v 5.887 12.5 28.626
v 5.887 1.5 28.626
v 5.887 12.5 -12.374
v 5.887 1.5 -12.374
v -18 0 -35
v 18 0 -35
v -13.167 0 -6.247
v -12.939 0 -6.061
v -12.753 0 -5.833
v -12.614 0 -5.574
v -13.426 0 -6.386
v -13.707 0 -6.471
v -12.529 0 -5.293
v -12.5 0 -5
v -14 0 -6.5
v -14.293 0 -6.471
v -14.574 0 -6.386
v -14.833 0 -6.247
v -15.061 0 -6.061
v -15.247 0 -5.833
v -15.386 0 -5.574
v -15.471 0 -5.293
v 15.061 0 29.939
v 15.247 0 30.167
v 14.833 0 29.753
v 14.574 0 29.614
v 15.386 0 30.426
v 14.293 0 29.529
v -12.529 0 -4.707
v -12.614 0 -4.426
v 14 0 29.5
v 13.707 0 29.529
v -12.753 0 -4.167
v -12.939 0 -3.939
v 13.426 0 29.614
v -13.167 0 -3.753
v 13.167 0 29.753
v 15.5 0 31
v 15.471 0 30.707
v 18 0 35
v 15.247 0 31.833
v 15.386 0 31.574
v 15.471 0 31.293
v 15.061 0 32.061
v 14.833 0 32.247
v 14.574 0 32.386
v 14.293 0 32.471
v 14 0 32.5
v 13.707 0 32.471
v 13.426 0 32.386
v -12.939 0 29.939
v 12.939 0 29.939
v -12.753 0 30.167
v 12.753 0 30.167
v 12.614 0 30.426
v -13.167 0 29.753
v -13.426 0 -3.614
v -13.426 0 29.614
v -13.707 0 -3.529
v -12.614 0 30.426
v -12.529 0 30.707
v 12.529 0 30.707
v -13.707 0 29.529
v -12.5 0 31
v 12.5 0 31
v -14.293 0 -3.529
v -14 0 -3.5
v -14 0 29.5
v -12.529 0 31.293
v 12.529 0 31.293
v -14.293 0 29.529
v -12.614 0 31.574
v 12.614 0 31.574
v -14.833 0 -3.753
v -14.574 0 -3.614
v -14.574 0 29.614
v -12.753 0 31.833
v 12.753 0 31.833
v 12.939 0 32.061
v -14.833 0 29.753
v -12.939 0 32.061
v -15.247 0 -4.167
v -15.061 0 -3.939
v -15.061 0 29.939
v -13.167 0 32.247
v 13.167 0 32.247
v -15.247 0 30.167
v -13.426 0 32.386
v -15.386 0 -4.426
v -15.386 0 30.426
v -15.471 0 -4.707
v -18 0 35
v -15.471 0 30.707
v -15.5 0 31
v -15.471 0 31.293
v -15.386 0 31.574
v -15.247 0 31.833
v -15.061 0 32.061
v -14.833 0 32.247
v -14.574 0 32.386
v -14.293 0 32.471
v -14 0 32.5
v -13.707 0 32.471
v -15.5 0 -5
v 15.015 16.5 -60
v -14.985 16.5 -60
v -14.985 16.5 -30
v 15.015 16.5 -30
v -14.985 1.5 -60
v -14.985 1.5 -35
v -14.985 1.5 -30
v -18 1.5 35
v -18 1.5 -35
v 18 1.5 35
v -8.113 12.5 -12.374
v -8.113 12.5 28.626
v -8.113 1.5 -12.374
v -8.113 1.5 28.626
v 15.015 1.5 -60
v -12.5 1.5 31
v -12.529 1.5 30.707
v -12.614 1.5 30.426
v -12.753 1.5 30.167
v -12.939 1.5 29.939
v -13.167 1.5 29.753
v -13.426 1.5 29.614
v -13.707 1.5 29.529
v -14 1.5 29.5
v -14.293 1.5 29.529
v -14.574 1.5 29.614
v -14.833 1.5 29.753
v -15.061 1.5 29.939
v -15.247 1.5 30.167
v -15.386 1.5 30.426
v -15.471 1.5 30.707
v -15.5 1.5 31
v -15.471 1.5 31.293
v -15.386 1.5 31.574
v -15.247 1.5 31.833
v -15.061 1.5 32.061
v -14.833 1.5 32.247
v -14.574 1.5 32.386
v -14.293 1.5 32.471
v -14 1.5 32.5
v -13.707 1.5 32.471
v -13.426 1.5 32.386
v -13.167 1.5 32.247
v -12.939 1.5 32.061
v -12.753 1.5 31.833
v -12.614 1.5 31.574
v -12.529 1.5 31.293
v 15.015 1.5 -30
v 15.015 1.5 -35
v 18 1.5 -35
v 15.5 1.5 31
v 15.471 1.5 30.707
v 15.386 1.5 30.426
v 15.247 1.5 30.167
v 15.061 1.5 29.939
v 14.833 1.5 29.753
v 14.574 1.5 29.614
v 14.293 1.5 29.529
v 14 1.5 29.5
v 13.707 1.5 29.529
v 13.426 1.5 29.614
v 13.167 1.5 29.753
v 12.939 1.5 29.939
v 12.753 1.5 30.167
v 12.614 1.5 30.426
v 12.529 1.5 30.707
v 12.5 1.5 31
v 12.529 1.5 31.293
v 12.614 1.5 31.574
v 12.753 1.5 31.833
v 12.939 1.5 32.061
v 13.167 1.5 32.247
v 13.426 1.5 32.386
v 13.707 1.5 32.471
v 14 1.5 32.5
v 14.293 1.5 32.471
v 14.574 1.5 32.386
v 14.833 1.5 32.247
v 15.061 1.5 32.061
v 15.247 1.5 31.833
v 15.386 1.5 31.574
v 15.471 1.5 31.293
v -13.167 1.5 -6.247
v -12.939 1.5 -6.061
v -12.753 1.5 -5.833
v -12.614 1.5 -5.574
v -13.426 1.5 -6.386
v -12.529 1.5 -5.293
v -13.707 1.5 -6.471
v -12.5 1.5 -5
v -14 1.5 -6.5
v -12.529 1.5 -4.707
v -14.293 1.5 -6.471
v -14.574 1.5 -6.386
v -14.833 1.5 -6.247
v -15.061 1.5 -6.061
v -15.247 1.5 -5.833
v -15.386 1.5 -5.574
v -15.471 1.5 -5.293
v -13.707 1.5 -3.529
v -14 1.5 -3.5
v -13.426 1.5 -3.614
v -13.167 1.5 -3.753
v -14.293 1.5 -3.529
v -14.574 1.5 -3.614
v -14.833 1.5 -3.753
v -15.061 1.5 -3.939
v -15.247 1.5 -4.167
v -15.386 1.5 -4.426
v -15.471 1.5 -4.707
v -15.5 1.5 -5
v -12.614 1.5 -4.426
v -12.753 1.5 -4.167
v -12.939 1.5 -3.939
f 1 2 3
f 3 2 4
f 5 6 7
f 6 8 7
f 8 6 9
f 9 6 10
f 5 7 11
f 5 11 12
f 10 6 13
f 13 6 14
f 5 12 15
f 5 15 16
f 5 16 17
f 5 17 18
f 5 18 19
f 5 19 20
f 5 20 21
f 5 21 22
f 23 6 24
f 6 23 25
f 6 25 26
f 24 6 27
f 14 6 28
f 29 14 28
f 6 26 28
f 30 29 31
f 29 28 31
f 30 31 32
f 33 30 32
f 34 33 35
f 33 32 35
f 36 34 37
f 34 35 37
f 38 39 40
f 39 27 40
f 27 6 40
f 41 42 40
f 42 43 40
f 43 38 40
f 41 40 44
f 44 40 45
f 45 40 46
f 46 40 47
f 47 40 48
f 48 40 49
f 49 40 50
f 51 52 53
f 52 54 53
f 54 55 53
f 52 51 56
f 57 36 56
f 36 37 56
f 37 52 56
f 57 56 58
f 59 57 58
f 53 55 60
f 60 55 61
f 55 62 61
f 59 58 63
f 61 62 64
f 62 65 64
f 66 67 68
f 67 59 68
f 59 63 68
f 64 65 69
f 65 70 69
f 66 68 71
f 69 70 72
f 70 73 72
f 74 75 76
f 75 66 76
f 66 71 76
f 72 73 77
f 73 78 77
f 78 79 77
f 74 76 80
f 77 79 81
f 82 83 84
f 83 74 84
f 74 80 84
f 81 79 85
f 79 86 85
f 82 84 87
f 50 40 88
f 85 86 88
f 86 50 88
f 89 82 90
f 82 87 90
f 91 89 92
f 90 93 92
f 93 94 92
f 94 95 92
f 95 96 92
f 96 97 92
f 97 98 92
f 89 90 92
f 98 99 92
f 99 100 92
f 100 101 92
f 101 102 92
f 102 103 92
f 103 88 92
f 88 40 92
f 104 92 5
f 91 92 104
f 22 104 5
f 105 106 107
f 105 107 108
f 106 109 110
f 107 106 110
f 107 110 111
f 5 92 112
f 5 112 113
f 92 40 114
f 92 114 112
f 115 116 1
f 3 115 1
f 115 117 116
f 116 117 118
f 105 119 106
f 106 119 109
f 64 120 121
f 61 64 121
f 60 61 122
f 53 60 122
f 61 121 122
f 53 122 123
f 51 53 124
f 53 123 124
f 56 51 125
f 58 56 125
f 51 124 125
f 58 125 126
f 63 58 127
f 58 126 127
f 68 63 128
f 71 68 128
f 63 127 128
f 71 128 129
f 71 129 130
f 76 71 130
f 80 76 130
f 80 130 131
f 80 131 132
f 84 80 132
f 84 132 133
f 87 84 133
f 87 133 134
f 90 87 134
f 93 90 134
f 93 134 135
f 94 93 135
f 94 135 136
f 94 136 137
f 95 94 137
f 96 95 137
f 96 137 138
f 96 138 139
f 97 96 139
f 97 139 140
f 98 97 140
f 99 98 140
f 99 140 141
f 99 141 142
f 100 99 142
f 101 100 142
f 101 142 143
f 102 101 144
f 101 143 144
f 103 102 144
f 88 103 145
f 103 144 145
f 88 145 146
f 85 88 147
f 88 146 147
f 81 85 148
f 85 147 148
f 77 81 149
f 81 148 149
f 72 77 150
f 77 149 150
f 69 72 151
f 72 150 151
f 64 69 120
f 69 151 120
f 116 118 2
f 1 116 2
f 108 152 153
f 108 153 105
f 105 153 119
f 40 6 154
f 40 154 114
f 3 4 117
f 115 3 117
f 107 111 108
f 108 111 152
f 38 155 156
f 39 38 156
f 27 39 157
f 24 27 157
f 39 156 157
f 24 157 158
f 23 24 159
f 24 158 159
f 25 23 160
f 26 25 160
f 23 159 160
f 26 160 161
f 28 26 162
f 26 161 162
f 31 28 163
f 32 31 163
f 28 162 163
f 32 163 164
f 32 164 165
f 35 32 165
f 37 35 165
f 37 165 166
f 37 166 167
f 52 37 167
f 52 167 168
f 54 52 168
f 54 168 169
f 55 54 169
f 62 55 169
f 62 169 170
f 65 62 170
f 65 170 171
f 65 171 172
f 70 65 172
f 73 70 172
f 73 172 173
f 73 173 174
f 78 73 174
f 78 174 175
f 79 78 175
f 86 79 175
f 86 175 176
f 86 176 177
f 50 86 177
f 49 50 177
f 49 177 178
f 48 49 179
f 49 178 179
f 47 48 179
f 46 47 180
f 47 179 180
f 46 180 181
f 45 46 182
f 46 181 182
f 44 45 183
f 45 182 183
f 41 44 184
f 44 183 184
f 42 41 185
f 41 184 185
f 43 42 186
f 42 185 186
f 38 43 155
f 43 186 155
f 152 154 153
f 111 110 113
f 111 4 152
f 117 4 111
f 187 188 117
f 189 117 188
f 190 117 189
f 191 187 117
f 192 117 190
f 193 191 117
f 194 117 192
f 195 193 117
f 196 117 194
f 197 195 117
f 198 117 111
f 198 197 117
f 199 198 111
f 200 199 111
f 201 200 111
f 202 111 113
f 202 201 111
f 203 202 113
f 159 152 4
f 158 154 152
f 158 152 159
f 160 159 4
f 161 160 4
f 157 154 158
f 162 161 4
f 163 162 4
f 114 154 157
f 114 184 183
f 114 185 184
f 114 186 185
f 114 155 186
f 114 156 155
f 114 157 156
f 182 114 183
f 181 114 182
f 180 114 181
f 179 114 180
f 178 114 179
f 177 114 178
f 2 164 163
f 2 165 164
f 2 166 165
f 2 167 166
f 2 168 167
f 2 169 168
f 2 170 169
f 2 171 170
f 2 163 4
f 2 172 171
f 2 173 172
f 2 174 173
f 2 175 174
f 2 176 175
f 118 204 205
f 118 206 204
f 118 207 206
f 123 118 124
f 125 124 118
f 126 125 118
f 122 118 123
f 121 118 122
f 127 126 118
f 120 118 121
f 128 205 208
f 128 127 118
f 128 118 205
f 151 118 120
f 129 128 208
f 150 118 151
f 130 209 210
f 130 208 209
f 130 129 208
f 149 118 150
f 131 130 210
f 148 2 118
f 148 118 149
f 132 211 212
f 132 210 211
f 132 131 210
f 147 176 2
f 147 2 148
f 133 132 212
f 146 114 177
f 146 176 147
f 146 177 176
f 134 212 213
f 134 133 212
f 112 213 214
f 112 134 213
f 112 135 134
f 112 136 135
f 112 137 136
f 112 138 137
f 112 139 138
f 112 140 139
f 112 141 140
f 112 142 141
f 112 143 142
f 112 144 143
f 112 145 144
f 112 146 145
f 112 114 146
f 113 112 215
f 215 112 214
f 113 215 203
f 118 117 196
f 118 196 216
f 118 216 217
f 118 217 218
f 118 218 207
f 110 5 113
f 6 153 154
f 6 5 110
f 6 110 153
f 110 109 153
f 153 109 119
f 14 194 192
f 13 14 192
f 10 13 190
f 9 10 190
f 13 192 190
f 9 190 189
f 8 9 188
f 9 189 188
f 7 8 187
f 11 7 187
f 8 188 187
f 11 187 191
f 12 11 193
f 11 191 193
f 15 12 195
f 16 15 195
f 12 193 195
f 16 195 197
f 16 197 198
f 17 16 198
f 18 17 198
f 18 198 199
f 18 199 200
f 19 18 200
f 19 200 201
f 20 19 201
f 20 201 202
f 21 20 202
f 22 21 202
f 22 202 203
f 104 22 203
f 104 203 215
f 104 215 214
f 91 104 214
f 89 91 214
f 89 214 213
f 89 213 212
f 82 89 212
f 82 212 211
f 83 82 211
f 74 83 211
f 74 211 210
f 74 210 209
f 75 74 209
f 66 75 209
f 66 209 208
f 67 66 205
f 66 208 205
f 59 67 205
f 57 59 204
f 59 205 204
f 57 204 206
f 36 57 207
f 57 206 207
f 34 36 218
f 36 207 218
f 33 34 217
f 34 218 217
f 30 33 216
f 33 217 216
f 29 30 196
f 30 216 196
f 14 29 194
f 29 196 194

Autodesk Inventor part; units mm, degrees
ref_plane "YZ Plane" through (0, 0, 0) normal (1, 0, 0) x (0, 1, 0)
ref_plane "XZ Plane" through (0, 0, 0) normal (0, 1, 0) x (-1, 0, 0)
ref_plane "XY Plane" through (0, 0, 0) normal (0, 0, 1) x (1, 0, 0)
sketch "Sketch1" plane through (0, 0, 0) normal (0, 1, 0) x (-1, 0, 0)
  line L0 (-18, 35) -> (18, 35)
  line L1 (18, 35) -> (18, -35)
  line L2 (18, -35) -> (-18, -35)
  line L3 (-18, -35) -> (-18, 35)
  line L4 (-18, 35) -> (18, -35) construction
  line L5 (18, 35) -> (-18, -35) construction
  point P0 (0, 0)
  dimension "d0" = 70
  dimension "d1" = 36
extrude "Extrusion1" add sketch "Sketch1" along normal blind 1.5
sketch "Sketch2" plane through (0, 1.5, 0) normal (0, 1, 0) x (1, 0, 0)
  line L0 (-48.0959, 5) -> (45.6433, 5) construction
  line L1 (-14, -63.3043) -> (-14, 77.913) construction
  line L2 (14, -60.8696) -> (14, 81.5652) construction
  line L3 (-37.753, -31) -> (38.247, -31) construction
  line L4 (0, 110.5391) -> (0, -92.2783) construction
  circle A0 centre (-14, -31) radius 1.5
  circle A1 centre (14, -31) radius 1.5
  circle A2 centre (-14, 5) radius 1.5
  line L5 (-18, -35) -> (18, -35) projected
  point P0 (0, 0)
  dimension "d4" = 28
  dimension "d5" = 36
  dimension "d6" = 14
  dimension "d7" = 3
  dimension "d8" = 3
  dimension "d9" = 3
  dimension "d10" = 4
extrude "Extrusion2" cut sketch "Sketch2" against normal through all
sketch "Sketch3" plane through (0, 1.5, 0) normal (0, 1, 0) x (1, 0, 0)
  line L0 (-8.1133, -28.6264) -> (5.8867, -28.6264)
  line L1 (5.8867, -28.6264) -> (5.8867, 12.3736)
  line L2 (5.8867, 12.3736) -> (-8.1133, 12.3736)
  line L3 (-8.1133, 12.3736) -> (-8.1133, -28.6264)
  point P0 (0, 0)
  dimension "d13" = 41
  dimension "d14" = 14
extrude "Extrusion3" add sketch "Sketch3" along normal blind 11
sketch "Sketch4" plane through (0, 1.5, 0) normal (0, 1, 0) x (1, 0, 0)
  line L0 (-14.9852, 30) -> (15.0148, 30)
  line L1 (15.0148, 30) -> (15.0148, 60)
  line L2 (15.0148, 60) -> (-14.9852, 60)
  line L3 (-14.9852, 60) -> (-14.9852, 30)
  line L4 (18, 35) -> (-18, 35) construction
  point P0 (0, 0)
  dimension "d17" = 30
  dimension "d18" = 30
  dimension "d21" = 5
extrude "Extrusion4" add sketch "Sketch4" along normal blind 15
properties part number "newhub"
